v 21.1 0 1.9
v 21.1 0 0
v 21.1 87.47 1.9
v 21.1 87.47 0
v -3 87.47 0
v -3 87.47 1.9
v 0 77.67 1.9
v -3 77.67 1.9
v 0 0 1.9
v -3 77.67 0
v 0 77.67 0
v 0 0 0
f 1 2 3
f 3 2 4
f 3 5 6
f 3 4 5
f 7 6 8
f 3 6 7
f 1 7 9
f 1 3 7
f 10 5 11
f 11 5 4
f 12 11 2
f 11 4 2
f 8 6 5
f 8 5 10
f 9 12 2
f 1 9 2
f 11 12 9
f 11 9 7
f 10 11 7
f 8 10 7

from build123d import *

# Parameters (mm, degrees)
F0_W     = 21.1
F0_H     = 87.47
F1_DEPTH = 1.9
F2_W     = 17.6
F2_H     = 83.77
F2_W_2   = 13.6
F2_H_2   = 79.77
F3_DEPTH = 0.8
F4_W     = 9.8
F4_H     = 1.9
F5_DEPTH = 3


with BuildPart() as f1:
    # F0 (on Top) → F1 (new body)
    with BuildSketch(Plane.XY):
        with Locations((10.55, 43.735)):
            Rectangle(F0_W, F0_H)
    extrude(amount=F1_DEPTH)

    # F4 (on face) → F5 (join)
    with BuildSketch(Plane(origin=(0, 0, 0), x_dir=(0, -1, 0), z_dir=(-1, 0, 0))):
        with Locations((-82.57, 0.95)):
            Rectangle(F4_W, F4_H)
    extrude(amount=F5_DEPTH)


with BuildPart() as f3:
    # F2 (on Top) → F3 (new body)
    with BuildSketch(Plane.XY):
        with Locations((36.552641, 44.763047)):
            Rectangle(F2_W, F2_H)
        with Locations((36.552641, 44.763047)):
            Rectangle(F2_W_2, F2_H_2, mode=Mode.SUBTRACT)
    extrude(amount=F3_DEPTH)


solid = f1.part
